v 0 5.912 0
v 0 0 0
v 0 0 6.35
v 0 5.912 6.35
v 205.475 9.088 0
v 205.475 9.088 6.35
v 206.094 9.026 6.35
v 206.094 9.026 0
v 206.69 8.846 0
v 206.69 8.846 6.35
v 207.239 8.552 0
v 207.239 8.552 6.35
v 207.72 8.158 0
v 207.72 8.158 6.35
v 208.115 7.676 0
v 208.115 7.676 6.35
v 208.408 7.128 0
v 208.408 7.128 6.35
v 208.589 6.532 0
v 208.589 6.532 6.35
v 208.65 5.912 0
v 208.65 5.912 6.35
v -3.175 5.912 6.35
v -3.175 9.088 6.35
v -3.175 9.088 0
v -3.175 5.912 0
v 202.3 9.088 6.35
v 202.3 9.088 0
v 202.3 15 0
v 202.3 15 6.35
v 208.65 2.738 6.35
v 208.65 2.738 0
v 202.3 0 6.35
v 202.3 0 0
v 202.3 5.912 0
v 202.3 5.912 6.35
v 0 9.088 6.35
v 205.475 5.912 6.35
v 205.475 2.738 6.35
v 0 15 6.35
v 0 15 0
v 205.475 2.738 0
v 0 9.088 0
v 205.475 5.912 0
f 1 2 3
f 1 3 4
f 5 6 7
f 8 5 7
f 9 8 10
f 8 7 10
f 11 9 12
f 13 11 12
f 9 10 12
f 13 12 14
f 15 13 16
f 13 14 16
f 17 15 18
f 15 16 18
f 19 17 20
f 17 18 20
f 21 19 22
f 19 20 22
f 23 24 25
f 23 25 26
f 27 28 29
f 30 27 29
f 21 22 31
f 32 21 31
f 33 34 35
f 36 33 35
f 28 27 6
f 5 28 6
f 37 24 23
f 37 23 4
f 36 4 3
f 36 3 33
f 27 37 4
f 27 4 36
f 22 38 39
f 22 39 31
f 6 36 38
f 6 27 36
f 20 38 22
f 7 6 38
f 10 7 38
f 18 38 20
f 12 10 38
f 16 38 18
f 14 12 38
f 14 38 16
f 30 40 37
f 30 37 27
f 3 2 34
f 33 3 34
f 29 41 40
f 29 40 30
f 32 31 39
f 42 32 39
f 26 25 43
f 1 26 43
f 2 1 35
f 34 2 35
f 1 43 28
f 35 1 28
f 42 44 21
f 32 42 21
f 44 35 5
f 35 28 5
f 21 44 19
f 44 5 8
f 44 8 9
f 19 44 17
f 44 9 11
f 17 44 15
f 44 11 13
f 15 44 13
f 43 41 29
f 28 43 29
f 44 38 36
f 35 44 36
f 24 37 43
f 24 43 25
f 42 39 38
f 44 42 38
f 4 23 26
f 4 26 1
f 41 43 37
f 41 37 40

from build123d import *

# Parameters (mm, degrees)
SKETCH1_W           = 202.3
SKETCH1_H           = 15
BOSS_EXTRUDE1_DEPTH = 6.35
BOSS_EXTRUDE2_DEPTH = 6.35


with BuildPart() as part:
    # Sketch1 → Boss-Extrude1 (new body)
    with BuildSketch(Plane.XY):
        with Locations((101.15, 7.5)):
            Rectangle(SKETCH1_W, SKETCH1_H)
    extrude(amount=BOSS_EXTRUDE1_DEPTH)

    # Sketch2 → Boss-Extrude2 (add)
    with BuildSketch(Plane.XY.offset(6.35)):
        with BuildLine():
            Line((208.65, 5.9125), (208.65, 2.7375))
            Line((208.65, 2.7375), (205.475, 2.7375))
            Line((205.475, 2.7375), (205.475, 5.9125))
            Line((205.475, 5.9125), (202.3, 5.9125))
            Line((202.3, 5.9125), (202.3, 7.5))
            Line((202.3, 7.5), (202.3, 9.0875))
            Line((202.3, 9.0875), (205.475, 9.0875))
            ThreePointArc((205.475, 9.0875), (207.72006403, 8.15756403), (208.65, 5.9125))
        make_face()
        Polygon((0, 7.5), (0, 9.0875), (-3.175, 9.0875), (-3.175, 5.9125), (0, 5.9125), align=None)
    extrude(amount=-BOSS_EXTRUDE2_DEPTH)


solid = part.part
